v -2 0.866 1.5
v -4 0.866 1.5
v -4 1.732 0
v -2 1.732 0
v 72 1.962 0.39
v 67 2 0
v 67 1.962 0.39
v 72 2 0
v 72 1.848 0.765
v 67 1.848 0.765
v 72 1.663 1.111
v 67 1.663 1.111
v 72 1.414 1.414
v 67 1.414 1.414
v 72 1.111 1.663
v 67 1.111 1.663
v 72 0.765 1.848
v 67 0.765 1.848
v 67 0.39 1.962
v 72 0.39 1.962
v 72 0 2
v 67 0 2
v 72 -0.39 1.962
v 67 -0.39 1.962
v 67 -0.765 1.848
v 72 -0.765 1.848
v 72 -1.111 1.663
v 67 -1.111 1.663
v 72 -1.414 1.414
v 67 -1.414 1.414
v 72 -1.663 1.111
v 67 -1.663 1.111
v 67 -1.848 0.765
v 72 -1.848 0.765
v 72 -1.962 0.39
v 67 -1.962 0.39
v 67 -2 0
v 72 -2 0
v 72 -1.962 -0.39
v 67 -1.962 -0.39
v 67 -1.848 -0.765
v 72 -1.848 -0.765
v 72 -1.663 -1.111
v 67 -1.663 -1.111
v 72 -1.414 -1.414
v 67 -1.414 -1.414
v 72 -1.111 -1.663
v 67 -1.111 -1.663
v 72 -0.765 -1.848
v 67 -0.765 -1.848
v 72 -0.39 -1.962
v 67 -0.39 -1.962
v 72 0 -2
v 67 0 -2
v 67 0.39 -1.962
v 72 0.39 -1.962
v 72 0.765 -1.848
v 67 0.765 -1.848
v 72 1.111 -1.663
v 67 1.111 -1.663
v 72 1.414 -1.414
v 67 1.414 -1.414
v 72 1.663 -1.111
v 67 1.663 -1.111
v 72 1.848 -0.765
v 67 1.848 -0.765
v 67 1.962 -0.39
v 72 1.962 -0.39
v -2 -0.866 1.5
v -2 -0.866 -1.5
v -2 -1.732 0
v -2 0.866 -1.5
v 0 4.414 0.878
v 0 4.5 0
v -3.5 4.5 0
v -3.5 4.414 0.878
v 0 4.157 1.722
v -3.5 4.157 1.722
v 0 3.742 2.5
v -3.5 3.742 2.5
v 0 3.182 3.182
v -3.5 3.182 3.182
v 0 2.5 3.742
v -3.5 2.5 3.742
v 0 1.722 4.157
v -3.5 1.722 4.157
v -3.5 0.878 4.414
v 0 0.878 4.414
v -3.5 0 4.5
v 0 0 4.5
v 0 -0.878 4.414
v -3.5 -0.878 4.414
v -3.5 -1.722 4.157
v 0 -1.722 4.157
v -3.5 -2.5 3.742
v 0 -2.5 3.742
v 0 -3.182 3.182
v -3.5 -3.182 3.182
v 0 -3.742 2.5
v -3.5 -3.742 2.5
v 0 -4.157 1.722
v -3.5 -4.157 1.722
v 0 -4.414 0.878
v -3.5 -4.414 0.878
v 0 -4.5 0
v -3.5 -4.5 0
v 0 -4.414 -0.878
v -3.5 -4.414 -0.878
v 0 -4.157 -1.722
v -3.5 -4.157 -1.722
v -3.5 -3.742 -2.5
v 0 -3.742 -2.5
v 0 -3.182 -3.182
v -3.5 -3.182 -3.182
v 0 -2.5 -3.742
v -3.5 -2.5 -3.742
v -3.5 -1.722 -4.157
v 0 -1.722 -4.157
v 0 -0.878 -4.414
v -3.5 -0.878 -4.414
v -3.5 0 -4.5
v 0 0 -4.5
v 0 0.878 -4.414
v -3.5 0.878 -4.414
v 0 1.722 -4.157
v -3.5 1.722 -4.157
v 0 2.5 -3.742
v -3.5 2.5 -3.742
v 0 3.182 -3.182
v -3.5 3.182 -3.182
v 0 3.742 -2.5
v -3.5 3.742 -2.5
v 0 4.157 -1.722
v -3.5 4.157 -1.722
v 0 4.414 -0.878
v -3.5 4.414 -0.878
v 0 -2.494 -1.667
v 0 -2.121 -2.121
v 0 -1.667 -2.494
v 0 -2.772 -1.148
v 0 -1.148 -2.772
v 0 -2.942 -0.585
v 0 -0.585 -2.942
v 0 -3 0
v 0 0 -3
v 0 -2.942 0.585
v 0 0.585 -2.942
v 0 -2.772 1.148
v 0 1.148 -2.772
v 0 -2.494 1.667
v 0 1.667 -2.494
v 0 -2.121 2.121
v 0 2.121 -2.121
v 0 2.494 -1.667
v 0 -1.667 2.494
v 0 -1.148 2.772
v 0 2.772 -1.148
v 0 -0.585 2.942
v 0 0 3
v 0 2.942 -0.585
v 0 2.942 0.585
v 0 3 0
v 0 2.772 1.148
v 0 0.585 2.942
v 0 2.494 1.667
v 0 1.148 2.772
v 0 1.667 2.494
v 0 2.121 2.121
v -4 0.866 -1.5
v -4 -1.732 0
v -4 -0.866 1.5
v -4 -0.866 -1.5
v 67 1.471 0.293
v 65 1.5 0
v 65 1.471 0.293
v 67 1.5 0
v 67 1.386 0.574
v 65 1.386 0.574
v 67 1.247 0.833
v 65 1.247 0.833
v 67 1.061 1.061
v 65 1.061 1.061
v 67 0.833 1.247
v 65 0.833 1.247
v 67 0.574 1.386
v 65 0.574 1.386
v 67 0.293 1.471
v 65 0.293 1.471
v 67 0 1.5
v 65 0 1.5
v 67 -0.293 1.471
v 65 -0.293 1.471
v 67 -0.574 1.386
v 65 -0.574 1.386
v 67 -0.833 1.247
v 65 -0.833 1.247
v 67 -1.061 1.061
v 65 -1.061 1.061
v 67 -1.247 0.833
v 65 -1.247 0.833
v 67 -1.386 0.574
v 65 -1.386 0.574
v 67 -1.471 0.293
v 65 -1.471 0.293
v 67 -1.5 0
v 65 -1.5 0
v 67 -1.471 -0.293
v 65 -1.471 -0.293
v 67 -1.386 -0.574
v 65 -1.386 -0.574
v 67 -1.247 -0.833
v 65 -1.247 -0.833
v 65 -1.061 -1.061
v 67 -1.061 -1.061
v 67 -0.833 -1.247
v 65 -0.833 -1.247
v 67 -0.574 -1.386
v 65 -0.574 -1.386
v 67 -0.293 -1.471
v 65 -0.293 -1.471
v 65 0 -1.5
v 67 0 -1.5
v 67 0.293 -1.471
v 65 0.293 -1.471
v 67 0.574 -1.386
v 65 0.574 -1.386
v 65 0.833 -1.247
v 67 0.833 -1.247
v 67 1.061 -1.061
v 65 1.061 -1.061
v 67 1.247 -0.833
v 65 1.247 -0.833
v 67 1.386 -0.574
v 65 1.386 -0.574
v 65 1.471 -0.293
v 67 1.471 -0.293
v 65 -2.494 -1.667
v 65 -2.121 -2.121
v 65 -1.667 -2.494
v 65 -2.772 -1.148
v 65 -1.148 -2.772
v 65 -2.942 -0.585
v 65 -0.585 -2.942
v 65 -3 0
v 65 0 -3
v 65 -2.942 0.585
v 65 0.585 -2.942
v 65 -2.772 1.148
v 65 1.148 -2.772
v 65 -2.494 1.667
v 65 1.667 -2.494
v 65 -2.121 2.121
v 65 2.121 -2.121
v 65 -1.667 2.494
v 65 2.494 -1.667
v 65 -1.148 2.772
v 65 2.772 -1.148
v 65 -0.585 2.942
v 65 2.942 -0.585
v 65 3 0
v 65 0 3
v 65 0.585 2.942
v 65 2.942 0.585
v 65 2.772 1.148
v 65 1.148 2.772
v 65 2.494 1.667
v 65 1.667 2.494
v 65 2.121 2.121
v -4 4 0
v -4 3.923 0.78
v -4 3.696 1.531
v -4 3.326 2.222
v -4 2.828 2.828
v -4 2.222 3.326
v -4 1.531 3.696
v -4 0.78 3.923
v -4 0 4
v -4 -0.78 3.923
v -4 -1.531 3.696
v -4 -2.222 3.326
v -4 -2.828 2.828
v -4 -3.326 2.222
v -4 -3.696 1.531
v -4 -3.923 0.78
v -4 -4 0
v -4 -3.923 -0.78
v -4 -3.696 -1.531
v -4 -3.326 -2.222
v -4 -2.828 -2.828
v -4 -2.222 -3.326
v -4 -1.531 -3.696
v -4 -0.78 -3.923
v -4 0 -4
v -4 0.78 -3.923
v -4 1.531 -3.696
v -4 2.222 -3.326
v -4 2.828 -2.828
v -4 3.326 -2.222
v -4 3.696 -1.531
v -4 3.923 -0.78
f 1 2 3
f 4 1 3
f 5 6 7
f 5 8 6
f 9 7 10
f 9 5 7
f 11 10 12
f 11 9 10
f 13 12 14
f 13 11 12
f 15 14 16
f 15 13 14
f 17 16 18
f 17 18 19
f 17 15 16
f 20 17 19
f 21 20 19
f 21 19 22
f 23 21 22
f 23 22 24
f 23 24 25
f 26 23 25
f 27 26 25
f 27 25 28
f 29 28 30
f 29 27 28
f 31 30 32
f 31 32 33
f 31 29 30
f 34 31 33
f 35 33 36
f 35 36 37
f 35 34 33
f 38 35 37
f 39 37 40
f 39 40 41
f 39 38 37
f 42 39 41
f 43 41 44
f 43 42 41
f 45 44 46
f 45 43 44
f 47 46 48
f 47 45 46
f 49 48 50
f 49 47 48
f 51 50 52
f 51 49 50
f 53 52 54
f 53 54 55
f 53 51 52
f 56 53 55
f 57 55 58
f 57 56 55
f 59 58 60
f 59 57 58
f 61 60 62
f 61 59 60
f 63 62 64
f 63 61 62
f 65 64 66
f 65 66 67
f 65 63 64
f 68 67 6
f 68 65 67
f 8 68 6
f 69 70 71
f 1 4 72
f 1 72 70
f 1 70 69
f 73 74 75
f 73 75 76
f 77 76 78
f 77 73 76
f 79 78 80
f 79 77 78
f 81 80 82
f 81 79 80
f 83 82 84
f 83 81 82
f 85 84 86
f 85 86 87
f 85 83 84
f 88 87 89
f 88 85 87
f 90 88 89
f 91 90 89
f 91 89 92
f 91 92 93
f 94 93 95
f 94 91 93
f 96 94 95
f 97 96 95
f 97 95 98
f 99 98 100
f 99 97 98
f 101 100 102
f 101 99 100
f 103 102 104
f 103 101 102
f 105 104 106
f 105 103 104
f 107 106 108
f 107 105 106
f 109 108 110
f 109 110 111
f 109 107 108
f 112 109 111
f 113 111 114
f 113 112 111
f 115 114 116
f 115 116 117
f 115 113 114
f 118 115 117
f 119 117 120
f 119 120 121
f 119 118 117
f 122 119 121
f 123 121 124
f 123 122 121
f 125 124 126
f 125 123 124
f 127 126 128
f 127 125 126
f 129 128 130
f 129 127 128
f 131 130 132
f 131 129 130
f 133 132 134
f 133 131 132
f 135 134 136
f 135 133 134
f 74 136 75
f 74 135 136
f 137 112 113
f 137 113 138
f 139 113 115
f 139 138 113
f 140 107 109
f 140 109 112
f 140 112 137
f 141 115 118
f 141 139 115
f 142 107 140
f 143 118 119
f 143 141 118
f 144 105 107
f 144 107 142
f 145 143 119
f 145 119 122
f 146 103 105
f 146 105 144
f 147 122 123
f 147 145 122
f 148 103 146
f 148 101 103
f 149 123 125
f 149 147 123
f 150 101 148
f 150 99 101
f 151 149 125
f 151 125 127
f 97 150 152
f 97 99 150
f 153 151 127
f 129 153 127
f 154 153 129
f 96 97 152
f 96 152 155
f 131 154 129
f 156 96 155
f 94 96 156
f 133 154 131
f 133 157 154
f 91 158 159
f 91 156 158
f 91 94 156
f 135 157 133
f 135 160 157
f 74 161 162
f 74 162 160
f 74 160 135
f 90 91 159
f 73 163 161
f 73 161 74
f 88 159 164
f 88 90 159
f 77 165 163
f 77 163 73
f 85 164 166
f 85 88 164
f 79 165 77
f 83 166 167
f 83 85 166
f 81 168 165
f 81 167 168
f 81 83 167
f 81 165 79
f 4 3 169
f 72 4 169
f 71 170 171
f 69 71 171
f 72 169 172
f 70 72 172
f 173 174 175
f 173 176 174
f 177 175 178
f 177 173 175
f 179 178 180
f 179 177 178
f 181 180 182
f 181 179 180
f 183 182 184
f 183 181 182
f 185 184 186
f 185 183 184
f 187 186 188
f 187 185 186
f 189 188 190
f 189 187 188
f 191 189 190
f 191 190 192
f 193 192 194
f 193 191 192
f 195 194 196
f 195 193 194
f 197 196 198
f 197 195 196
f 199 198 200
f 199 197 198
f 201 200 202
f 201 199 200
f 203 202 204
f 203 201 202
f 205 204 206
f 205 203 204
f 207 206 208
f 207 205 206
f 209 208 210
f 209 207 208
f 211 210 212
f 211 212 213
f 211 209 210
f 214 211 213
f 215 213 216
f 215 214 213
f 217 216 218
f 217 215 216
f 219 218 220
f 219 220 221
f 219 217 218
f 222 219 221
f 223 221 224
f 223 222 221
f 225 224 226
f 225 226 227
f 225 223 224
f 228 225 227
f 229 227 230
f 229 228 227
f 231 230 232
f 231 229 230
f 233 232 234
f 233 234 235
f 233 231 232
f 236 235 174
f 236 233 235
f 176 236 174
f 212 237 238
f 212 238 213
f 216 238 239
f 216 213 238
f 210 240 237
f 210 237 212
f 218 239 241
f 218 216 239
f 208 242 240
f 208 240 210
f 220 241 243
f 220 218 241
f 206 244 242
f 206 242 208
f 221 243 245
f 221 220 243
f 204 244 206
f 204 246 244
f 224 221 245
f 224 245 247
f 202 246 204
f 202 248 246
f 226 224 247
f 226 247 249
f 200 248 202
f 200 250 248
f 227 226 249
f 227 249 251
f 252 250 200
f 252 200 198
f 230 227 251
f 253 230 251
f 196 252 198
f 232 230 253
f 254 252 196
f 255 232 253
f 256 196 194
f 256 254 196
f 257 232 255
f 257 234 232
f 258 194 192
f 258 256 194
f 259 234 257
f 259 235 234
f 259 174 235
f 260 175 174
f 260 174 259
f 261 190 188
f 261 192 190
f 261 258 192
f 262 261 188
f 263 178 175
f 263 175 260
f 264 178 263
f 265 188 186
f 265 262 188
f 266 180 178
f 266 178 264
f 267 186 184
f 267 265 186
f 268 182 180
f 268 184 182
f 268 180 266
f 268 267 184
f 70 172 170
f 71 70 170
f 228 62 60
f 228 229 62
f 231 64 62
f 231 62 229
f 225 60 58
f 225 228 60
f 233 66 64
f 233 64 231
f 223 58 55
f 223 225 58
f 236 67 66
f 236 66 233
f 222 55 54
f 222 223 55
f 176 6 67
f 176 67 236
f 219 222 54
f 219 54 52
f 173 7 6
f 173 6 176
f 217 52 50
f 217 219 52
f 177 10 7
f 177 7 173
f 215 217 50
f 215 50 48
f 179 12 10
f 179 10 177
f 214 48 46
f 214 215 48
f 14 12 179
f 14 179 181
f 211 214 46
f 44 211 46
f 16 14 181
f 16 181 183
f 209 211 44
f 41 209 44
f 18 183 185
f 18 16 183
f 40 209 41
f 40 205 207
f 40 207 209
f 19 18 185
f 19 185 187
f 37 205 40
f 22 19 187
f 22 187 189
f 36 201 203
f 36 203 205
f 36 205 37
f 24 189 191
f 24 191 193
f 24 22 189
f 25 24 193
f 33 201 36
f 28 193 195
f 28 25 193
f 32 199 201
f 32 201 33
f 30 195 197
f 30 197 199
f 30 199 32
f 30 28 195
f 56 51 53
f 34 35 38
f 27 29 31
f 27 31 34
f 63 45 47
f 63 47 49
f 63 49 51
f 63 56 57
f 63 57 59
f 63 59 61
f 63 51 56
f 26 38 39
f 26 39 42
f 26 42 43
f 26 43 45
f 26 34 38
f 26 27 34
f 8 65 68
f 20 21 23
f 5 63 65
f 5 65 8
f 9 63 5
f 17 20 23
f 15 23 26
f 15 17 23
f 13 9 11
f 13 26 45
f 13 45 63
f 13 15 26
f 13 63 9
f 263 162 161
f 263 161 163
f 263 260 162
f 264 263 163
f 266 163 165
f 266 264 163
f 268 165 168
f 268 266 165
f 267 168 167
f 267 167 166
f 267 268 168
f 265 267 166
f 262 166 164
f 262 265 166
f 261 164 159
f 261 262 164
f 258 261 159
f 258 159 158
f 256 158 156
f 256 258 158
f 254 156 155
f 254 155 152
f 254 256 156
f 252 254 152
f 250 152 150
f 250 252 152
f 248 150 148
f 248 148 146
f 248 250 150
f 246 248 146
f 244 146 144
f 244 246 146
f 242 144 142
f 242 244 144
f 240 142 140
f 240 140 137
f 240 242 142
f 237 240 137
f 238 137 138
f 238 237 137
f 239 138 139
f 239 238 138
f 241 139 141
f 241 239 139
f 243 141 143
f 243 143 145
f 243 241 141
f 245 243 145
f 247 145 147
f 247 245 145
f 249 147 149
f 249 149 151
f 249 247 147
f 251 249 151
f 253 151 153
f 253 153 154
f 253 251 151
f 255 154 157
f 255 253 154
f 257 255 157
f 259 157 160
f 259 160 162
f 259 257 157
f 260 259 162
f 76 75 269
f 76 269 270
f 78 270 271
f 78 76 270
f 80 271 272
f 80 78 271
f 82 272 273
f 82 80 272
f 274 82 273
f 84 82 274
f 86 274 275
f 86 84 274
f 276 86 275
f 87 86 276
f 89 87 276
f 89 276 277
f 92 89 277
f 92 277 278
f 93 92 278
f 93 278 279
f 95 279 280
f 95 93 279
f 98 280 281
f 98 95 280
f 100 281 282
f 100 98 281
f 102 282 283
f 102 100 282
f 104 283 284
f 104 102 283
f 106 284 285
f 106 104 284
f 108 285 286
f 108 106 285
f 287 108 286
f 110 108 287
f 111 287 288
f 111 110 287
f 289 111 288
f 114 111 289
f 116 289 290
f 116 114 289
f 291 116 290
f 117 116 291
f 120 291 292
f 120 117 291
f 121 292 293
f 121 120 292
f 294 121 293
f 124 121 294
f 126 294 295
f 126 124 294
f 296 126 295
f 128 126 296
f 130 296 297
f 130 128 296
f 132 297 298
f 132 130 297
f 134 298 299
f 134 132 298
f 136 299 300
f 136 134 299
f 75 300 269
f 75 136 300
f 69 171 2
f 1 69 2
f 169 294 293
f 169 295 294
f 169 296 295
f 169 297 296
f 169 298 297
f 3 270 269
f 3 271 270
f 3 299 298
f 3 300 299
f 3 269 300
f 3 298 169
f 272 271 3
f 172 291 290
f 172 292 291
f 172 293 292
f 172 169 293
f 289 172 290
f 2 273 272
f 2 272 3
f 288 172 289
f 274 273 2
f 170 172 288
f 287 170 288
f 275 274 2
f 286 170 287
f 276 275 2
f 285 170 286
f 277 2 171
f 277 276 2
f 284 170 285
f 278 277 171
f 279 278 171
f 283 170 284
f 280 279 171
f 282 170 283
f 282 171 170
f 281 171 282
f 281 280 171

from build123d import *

# Parameters (mm, degrees)
CHAMFER2_SIZE      = 0.5
CUT_EXTRUDE1_DEPTH = 2


with BuildPart() as part:
    # Sketch1 → Revolve1 (revolve)
    with BuildSketch(Plane.XY):
        Polygon((0, 3), (65, 3), (65, 1.5), (67, 1.5), (67, 2), (72, 2), (72, 0), (-4, 0), (-4, 4.5), (0, 4.5), align=None)
    revolve(axis=Axis((-15.448246648, 0, 0), (1, 0, 0)))

    # Chamfer2
    chamfer2_edges = [part.edges().sort_by_distance(p)[0] for p in [
        (-4, -4.5, 0),
    ]]
    chamfer(chamfer2_edges, length=CHAMFER2_SIZE)

    # Sketch2 → Cut-Extrude1 (cut)
    with BuildSketch(Plane.ZY.offset(4)):
        Polygon((0, 1.732050808), (-1.5, 0.866025404), (-1.5, -0.866025404), (0, -1.732050808), (1.5, -0.866025404), (1.5, 0.866025404), align=None)
    extrude(amount=-CUT_EXTRUDE1_DEPTH, mode=Mode.SUBTRACT)


solid = part.part
